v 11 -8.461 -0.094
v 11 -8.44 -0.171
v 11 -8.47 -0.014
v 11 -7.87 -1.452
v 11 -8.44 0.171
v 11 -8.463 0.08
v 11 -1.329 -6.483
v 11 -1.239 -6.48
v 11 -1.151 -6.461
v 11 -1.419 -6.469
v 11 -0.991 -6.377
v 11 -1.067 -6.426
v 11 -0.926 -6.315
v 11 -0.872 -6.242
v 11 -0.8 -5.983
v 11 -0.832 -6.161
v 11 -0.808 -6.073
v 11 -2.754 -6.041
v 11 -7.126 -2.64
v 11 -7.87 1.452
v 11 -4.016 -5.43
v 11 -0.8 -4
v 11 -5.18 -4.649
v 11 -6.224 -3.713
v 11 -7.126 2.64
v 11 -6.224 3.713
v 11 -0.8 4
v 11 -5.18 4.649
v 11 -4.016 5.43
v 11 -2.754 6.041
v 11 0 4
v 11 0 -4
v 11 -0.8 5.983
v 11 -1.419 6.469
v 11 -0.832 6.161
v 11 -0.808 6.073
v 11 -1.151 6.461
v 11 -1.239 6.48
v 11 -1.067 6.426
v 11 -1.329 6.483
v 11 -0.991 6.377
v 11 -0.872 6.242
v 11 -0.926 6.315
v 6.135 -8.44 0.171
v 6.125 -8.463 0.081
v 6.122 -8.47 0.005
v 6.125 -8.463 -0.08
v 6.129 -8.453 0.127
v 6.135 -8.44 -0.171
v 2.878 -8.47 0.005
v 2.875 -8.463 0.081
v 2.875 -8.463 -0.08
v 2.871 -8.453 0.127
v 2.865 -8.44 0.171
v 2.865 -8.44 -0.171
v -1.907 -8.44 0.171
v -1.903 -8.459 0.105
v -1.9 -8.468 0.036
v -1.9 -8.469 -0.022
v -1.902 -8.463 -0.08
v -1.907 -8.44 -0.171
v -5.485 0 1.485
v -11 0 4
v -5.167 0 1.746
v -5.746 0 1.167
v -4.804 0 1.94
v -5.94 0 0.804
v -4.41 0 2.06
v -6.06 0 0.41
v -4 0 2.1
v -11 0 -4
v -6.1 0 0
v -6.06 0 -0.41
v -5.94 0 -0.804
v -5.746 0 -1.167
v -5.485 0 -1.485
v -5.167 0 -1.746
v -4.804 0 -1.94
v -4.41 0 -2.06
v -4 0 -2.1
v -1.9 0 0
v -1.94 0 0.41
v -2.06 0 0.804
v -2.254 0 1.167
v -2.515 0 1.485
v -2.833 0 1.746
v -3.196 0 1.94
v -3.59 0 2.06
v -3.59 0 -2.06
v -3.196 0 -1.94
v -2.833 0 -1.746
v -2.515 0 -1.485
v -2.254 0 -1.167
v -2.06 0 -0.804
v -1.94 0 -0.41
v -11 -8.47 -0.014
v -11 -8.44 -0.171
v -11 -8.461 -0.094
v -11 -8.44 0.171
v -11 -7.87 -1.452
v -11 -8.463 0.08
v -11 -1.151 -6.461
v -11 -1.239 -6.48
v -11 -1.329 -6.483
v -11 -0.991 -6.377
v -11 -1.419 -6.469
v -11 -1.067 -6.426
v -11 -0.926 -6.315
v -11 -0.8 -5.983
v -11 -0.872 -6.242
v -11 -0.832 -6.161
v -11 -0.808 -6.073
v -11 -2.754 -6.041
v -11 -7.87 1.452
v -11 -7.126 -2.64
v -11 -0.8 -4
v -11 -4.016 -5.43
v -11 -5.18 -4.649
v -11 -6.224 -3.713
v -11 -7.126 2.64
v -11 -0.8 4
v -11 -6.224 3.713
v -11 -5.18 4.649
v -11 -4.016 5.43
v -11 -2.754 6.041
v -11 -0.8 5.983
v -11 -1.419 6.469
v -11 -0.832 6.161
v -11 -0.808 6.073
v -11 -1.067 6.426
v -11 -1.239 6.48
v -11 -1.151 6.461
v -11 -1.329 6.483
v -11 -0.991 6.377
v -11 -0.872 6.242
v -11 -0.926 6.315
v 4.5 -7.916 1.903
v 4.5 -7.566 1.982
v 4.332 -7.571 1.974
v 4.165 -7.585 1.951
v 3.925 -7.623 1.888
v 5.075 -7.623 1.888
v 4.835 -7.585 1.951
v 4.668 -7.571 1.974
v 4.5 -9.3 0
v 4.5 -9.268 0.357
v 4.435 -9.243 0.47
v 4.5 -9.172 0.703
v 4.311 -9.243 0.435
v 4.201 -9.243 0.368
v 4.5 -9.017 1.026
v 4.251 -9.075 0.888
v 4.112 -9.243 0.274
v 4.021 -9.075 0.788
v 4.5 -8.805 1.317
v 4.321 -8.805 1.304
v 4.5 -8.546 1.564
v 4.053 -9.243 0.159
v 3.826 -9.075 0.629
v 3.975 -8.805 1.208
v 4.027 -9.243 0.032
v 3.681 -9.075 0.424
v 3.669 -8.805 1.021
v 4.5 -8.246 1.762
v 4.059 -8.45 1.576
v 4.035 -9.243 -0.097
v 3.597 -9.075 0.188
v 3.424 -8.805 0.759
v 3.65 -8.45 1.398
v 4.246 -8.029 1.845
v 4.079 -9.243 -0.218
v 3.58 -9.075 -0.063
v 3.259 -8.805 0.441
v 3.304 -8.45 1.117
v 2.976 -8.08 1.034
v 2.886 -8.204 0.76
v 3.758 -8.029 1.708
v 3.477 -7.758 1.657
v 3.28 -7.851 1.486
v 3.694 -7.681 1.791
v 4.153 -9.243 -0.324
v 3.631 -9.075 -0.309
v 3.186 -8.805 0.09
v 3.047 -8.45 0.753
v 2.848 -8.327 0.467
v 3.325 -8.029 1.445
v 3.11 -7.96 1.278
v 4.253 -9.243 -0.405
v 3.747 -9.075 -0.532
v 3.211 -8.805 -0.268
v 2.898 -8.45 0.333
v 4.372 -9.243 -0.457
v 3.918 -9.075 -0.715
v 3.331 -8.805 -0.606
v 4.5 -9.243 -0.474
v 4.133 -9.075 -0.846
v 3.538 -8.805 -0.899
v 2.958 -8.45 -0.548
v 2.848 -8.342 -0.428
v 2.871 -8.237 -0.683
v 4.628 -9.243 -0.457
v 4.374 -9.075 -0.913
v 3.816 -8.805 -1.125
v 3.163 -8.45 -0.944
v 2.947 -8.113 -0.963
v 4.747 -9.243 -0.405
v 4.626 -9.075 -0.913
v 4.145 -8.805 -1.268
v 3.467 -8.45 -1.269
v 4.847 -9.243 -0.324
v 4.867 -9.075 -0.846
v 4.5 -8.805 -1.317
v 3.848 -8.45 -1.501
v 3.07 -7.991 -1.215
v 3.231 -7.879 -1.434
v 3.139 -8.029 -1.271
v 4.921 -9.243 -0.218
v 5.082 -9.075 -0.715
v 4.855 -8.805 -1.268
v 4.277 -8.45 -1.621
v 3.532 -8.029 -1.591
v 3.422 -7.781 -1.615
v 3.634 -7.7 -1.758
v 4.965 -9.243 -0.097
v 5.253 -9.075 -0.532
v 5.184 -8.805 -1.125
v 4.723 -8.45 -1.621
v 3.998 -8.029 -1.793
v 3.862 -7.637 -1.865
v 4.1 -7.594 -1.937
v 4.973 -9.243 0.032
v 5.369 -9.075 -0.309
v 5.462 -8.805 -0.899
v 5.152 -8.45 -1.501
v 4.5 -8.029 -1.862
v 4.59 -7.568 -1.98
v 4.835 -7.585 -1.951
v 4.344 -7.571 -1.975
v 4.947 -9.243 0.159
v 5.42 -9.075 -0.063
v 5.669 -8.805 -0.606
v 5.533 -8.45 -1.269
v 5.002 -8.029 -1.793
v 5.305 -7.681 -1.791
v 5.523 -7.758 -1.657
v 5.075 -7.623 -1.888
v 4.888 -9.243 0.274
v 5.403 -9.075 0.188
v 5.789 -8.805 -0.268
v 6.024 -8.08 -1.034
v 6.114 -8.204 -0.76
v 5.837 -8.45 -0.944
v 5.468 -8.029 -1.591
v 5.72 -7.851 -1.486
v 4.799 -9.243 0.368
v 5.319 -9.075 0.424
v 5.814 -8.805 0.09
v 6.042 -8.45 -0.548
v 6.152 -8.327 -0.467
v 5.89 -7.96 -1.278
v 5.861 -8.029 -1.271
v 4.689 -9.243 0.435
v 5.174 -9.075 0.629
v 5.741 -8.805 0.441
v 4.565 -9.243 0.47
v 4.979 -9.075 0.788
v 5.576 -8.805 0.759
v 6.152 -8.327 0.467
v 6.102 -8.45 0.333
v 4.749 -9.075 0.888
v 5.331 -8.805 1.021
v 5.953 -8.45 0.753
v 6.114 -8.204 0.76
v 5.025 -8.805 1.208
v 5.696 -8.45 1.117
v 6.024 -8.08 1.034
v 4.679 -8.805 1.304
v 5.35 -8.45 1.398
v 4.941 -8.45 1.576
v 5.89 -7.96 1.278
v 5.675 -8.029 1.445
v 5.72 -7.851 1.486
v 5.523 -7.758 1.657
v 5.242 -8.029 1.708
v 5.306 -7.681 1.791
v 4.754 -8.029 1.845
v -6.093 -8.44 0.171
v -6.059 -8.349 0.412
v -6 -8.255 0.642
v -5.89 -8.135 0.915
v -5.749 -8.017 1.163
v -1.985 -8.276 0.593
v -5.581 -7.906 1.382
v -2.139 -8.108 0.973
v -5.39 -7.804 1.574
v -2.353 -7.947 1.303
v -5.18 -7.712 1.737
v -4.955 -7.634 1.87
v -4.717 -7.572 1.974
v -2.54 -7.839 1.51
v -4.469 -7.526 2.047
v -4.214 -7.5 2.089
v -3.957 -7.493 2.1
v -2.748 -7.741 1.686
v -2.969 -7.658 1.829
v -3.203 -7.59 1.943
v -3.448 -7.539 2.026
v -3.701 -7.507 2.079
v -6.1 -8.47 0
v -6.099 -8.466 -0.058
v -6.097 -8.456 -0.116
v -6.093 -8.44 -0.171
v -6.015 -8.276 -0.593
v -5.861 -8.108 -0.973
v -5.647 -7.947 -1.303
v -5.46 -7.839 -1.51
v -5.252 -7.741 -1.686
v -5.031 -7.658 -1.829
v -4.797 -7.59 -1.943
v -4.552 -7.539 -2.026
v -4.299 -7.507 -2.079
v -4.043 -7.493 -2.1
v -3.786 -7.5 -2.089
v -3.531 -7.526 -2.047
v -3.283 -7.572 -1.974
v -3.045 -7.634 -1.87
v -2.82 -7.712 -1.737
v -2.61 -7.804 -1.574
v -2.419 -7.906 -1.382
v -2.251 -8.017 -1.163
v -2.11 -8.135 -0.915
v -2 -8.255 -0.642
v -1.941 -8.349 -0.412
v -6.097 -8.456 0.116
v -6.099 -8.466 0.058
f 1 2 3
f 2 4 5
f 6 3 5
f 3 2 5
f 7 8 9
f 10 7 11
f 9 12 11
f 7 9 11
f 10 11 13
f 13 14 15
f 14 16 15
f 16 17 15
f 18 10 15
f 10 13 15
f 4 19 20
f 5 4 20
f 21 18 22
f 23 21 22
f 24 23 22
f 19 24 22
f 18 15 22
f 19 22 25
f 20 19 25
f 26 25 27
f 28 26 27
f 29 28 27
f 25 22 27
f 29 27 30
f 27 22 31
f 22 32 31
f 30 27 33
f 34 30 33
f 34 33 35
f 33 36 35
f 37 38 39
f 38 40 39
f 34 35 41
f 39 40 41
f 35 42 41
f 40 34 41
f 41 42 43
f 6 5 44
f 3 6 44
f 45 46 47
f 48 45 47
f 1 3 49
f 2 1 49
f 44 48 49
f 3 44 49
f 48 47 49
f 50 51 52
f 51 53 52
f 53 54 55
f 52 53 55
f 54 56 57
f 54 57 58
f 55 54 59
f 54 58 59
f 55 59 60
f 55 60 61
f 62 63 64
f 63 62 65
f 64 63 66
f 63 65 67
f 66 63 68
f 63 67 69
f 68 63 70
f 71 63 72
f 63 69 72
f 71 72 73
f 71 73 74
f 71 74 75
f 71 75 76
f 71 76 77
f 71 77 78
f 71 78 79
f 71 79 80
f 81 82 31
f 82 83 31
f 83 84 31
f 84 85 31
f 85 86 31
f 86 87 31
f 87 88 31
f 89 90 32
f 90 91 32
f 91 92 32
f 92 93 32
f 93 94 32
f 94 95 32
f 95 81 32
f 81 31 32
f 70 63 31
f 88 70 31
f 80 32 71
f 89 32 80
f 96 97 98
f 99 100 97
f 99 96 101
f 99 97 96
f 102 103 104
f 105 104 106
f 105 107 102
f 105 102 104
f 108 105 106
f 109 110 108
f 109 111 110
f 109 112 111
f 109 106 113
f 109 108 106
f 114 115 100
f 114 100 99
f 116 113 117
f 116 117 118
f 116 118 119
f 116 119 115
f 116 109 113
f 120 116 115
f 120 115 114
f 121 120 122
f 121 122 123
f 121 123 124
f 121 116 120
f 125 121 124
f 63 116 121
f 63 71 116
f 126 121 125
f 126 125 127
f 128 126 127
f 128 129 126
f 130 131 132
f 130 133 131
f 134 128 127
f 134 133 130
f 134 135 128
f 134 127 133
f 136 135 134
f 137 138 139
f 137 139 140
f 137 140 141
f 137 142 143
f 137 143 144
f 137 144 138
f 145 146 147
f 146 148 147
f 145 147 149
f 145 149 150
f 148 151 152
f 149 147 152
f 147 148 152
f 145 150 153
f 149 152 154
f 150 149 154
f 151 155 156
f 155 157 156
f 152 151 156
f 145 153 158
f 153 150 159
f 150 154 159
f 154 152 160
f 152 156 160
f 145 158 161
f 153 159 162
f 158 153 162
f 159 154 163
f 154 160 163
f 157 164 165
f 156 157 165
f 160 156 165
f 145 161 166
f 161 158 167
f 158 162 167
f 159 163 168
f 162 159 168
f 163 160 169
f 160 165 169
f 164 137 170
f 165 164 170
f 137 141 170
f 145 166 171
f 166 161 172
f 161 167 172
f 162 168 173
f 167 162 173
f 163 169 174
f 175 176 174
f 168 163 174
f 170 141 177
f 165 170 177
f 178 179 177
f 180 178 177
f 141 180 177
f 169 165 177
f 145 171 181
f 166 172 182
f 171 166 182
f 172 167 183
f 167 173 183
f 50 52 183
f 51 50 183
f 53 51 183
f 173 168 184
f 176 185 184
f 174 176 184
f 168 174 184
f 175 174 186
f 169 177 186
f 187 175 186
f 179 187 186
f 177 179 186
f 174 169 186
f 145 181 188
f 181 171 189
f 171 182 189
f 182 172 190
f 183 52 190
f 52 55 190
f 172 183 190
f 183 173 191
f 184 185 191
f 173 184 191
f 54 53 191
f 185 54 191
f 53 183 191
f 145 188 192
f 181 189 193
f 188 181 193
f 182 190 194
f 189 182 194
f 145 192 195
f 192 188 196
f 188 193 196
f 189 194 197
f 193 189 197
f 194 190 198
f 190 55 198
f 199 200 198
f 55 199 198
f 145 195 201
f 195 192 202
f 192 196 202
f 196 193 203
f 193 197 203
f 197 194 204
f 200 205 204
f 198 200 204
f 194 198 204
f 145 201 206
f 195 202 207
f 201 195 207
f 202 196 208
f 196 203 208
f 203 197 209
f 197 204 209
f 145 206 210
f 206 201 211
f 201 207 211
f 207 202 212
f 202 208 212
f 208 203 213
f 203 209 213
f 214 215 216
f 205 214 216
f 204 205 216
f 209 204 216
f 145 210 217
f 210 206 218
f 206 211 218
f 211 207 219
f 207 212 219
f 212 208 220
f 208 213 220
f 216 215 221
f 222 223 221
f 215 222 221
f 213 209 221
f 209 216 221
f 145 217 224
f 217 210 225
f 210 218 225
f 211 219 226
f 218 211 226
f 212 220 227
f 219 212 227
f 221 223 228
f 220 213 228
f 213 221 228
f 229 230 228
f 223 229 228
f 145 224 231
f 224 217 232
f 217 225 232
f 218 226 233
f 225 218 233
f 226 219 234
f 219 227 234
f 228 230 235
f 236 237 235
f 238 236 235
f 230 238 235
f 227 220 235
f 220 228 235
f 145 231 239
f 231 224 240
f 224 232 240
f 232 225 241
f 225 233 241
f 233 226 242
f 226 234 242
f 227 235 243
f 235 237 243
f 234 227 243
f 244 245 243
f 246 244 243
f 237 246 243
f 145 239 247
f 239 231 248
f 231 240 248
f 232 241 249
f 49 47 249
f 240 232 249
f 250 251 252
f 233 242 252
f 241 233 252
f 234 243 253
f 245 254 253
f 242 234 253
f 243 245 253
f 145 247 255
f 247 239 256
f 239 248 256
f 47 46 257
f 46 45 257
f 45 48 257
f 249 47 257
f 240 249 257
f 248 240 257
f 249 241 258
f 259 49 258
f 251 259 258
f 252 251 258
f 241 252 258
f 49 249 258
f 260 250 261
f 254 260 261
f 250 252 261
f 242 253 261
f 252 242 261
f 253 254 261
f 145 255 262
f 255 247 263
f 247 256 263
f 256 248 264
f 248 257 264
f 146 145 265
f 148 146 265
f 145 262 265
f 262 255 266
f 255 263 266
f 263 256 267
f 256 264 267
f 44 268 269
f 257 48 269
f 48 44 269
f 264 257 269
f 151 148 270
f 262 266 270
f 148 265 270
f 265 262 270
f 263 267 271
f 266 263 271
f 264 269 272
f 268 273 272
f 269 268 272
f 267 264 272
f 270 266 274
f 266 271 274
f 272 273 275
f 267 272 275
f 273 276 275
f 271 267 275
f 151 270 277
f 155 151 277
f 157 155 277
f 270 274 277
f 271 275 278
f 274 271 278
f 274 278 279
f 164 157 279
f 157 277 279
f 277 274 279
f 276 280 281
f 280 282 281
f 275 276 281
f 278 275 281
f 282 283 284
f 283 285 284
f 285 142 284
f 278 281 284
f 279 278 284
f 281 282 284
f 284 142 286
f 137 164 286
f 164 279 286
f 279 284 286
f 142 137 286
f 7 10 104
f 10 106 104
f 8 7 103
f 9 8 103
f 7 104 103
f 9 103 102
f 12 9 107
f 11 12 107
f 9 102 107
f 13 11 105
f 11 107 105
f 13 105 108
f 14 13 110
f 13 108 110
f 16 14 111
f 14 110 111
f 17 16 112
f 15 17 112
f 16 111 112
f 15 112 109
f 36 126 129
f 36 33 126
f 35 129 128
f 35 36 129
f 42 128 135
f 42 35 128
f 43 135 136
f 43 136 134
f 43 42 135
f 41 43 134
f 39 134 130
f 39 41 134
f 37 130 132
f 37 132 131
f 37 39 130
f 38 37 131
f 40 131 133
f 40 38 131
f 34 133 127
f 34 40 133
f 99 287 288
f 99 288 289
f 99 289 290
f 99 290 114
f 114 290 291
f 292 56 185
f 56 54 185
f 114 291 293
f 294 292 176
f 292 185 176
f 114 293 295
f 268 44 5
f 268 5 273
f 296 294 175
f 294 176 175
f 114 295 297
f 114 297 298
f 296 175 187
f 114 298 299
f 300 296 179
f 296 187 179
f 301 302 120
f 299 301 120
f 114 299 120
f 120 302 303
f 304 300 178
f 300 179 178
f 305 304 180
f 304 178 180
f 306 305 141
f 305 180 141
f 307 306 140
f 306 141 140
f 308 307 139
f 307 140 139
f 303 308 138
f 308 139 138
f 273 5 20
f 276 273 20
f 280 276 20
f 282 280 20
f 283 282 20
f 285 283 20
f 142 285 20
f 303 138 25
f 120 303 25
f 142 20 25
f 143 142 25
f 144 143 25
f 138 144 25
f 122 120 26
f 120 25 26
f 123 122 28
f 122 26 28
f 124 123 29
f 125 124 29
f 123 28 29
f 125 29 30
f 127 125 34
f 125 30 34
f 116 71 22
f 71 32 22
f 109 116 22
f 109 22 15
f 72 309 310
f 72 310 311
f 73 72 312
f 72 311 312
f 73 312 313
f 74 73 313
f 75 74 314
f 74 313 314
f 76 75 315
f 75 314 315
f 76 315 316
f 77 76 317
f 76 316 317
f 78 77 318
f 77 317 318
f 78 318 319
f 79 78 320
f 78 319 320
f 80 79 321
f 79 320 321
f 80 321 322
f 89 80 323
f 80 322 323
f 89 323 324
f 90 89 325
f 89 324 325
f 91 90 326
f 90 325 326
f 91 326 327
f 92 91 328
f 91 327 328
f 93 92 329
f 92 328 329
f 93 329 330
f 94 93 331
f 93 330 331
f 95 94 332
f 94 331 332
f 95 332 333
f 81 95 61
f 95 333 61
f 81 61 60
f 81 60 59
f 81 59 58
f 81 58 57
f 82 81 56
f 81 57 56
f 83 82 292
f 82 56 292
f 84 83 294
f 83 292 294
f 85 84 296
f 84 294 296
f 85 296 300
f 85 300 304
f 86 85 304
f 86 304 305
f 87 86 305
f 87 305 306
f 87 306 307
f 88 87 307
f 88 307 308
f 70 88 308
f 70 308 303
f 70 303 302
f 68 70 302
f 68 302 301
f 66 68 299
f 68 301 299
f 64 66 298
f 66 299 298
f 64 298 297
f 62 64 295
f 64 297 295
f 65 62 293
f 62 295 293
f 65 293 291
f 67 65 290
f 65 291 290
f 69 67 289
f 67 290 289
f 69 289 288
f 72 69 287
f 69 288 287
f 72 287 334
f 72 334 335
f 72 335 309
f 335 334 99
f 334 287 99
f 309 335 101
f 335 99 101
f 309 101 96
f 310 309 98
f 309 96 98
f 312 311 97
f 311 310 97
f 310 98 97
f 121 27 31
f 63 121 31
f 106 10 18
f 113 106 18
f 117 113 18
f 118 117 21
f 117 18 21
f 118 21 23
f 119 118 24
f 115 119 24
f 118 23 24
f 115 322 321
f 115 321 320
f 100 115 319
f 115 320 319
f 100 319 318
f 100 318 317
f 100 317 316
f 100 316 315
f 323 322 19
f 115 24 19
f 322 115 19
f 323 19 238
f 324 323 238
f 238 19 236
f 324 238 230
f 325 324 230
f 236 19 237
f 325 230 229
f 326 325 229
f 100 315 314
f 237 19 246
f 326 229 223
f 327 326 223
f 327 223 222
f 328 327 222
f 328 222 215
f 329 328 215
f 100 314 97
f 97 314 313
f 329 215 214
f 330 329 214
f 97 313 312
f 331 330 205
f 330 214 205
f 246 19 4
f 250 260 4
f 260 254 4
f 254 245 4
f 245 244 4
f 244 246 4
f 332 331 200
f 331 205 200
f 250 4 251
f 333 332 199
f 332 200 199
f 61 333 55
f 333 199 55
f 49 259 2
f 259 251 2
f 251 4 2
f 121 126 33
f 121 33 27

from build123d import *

# Parameters (mm, degrees)
DODANIE_WYCI_GNI_CIE1_DEPTH = 11
ZAOKR_GLENIE1_R             = 0.5
OTW_R_GWINTOWANY_M51_D      = 4.2


with BuildPart() as part:
    # Szkic1 → Dodanie-wyciągnięcie1 (new, symmetric)
    with BuildSketch(Plane(origin=(0, 0, 0), x_dir=(0, 0, -1), z_dir=(1, 0, 0))):
        with BuildLine():
            Line((-4, 0), (4, 0))
            Line((4, 0), (4, -0.8))
            Line((4, -0.8), (6.6, -0.8))
            ThreePointArc((6.6, -0.8), (4.348518436, -5.548730088), (0, -8.5))
            ThreePointArc((0, -8.5), (-4.348518436, -5.548730088), (-6.6, -0.8))
            Line((-6.6, -0.8), (-4, -0.8))
            Line((-4, -0.8), (-4, 0))
        make_face()
    extrude(amount=DODANIE_WYCI_GNI_CIE1_DEPTH, both=True)

    # Zaokrąglenie1
    zaokr_glenie1_edges = [part.edges().sort_by_distance(p)[0] for p in [
        (0, -0.8, -6.6),
        (0, -8.5, 0),
        (0, -0.8, 6.6),
    ]]
    fillet(zaokr_glenie1_edges, radius=ZAOKR_GLENIE1_R)

    # Otwór gwintowany M51 (through all)
    with Locations(Plane(origin=(0, 0, 0), x_dir=(1, 0, 0), z_dir=(0, 1, 0))):
        with Locations((-4, 0)):
            Hole(OTW_R_GWINTOWANY_M51_D / 2)

    # Szkic4 → Obrót1 (revolve)
    with BuildSketch(Plane.ZY.offset(-4.5)):
        with BuildLine():
            Line((0, -5.3), (0, -9.3))
            ThreePointArc((0, -9.3), (2, -7.3), (0, -5.3))
        make_face()
    revolve(axis=Axis((4.5, -5.3, 0), (0, -1, 0)))


solid = part.part
